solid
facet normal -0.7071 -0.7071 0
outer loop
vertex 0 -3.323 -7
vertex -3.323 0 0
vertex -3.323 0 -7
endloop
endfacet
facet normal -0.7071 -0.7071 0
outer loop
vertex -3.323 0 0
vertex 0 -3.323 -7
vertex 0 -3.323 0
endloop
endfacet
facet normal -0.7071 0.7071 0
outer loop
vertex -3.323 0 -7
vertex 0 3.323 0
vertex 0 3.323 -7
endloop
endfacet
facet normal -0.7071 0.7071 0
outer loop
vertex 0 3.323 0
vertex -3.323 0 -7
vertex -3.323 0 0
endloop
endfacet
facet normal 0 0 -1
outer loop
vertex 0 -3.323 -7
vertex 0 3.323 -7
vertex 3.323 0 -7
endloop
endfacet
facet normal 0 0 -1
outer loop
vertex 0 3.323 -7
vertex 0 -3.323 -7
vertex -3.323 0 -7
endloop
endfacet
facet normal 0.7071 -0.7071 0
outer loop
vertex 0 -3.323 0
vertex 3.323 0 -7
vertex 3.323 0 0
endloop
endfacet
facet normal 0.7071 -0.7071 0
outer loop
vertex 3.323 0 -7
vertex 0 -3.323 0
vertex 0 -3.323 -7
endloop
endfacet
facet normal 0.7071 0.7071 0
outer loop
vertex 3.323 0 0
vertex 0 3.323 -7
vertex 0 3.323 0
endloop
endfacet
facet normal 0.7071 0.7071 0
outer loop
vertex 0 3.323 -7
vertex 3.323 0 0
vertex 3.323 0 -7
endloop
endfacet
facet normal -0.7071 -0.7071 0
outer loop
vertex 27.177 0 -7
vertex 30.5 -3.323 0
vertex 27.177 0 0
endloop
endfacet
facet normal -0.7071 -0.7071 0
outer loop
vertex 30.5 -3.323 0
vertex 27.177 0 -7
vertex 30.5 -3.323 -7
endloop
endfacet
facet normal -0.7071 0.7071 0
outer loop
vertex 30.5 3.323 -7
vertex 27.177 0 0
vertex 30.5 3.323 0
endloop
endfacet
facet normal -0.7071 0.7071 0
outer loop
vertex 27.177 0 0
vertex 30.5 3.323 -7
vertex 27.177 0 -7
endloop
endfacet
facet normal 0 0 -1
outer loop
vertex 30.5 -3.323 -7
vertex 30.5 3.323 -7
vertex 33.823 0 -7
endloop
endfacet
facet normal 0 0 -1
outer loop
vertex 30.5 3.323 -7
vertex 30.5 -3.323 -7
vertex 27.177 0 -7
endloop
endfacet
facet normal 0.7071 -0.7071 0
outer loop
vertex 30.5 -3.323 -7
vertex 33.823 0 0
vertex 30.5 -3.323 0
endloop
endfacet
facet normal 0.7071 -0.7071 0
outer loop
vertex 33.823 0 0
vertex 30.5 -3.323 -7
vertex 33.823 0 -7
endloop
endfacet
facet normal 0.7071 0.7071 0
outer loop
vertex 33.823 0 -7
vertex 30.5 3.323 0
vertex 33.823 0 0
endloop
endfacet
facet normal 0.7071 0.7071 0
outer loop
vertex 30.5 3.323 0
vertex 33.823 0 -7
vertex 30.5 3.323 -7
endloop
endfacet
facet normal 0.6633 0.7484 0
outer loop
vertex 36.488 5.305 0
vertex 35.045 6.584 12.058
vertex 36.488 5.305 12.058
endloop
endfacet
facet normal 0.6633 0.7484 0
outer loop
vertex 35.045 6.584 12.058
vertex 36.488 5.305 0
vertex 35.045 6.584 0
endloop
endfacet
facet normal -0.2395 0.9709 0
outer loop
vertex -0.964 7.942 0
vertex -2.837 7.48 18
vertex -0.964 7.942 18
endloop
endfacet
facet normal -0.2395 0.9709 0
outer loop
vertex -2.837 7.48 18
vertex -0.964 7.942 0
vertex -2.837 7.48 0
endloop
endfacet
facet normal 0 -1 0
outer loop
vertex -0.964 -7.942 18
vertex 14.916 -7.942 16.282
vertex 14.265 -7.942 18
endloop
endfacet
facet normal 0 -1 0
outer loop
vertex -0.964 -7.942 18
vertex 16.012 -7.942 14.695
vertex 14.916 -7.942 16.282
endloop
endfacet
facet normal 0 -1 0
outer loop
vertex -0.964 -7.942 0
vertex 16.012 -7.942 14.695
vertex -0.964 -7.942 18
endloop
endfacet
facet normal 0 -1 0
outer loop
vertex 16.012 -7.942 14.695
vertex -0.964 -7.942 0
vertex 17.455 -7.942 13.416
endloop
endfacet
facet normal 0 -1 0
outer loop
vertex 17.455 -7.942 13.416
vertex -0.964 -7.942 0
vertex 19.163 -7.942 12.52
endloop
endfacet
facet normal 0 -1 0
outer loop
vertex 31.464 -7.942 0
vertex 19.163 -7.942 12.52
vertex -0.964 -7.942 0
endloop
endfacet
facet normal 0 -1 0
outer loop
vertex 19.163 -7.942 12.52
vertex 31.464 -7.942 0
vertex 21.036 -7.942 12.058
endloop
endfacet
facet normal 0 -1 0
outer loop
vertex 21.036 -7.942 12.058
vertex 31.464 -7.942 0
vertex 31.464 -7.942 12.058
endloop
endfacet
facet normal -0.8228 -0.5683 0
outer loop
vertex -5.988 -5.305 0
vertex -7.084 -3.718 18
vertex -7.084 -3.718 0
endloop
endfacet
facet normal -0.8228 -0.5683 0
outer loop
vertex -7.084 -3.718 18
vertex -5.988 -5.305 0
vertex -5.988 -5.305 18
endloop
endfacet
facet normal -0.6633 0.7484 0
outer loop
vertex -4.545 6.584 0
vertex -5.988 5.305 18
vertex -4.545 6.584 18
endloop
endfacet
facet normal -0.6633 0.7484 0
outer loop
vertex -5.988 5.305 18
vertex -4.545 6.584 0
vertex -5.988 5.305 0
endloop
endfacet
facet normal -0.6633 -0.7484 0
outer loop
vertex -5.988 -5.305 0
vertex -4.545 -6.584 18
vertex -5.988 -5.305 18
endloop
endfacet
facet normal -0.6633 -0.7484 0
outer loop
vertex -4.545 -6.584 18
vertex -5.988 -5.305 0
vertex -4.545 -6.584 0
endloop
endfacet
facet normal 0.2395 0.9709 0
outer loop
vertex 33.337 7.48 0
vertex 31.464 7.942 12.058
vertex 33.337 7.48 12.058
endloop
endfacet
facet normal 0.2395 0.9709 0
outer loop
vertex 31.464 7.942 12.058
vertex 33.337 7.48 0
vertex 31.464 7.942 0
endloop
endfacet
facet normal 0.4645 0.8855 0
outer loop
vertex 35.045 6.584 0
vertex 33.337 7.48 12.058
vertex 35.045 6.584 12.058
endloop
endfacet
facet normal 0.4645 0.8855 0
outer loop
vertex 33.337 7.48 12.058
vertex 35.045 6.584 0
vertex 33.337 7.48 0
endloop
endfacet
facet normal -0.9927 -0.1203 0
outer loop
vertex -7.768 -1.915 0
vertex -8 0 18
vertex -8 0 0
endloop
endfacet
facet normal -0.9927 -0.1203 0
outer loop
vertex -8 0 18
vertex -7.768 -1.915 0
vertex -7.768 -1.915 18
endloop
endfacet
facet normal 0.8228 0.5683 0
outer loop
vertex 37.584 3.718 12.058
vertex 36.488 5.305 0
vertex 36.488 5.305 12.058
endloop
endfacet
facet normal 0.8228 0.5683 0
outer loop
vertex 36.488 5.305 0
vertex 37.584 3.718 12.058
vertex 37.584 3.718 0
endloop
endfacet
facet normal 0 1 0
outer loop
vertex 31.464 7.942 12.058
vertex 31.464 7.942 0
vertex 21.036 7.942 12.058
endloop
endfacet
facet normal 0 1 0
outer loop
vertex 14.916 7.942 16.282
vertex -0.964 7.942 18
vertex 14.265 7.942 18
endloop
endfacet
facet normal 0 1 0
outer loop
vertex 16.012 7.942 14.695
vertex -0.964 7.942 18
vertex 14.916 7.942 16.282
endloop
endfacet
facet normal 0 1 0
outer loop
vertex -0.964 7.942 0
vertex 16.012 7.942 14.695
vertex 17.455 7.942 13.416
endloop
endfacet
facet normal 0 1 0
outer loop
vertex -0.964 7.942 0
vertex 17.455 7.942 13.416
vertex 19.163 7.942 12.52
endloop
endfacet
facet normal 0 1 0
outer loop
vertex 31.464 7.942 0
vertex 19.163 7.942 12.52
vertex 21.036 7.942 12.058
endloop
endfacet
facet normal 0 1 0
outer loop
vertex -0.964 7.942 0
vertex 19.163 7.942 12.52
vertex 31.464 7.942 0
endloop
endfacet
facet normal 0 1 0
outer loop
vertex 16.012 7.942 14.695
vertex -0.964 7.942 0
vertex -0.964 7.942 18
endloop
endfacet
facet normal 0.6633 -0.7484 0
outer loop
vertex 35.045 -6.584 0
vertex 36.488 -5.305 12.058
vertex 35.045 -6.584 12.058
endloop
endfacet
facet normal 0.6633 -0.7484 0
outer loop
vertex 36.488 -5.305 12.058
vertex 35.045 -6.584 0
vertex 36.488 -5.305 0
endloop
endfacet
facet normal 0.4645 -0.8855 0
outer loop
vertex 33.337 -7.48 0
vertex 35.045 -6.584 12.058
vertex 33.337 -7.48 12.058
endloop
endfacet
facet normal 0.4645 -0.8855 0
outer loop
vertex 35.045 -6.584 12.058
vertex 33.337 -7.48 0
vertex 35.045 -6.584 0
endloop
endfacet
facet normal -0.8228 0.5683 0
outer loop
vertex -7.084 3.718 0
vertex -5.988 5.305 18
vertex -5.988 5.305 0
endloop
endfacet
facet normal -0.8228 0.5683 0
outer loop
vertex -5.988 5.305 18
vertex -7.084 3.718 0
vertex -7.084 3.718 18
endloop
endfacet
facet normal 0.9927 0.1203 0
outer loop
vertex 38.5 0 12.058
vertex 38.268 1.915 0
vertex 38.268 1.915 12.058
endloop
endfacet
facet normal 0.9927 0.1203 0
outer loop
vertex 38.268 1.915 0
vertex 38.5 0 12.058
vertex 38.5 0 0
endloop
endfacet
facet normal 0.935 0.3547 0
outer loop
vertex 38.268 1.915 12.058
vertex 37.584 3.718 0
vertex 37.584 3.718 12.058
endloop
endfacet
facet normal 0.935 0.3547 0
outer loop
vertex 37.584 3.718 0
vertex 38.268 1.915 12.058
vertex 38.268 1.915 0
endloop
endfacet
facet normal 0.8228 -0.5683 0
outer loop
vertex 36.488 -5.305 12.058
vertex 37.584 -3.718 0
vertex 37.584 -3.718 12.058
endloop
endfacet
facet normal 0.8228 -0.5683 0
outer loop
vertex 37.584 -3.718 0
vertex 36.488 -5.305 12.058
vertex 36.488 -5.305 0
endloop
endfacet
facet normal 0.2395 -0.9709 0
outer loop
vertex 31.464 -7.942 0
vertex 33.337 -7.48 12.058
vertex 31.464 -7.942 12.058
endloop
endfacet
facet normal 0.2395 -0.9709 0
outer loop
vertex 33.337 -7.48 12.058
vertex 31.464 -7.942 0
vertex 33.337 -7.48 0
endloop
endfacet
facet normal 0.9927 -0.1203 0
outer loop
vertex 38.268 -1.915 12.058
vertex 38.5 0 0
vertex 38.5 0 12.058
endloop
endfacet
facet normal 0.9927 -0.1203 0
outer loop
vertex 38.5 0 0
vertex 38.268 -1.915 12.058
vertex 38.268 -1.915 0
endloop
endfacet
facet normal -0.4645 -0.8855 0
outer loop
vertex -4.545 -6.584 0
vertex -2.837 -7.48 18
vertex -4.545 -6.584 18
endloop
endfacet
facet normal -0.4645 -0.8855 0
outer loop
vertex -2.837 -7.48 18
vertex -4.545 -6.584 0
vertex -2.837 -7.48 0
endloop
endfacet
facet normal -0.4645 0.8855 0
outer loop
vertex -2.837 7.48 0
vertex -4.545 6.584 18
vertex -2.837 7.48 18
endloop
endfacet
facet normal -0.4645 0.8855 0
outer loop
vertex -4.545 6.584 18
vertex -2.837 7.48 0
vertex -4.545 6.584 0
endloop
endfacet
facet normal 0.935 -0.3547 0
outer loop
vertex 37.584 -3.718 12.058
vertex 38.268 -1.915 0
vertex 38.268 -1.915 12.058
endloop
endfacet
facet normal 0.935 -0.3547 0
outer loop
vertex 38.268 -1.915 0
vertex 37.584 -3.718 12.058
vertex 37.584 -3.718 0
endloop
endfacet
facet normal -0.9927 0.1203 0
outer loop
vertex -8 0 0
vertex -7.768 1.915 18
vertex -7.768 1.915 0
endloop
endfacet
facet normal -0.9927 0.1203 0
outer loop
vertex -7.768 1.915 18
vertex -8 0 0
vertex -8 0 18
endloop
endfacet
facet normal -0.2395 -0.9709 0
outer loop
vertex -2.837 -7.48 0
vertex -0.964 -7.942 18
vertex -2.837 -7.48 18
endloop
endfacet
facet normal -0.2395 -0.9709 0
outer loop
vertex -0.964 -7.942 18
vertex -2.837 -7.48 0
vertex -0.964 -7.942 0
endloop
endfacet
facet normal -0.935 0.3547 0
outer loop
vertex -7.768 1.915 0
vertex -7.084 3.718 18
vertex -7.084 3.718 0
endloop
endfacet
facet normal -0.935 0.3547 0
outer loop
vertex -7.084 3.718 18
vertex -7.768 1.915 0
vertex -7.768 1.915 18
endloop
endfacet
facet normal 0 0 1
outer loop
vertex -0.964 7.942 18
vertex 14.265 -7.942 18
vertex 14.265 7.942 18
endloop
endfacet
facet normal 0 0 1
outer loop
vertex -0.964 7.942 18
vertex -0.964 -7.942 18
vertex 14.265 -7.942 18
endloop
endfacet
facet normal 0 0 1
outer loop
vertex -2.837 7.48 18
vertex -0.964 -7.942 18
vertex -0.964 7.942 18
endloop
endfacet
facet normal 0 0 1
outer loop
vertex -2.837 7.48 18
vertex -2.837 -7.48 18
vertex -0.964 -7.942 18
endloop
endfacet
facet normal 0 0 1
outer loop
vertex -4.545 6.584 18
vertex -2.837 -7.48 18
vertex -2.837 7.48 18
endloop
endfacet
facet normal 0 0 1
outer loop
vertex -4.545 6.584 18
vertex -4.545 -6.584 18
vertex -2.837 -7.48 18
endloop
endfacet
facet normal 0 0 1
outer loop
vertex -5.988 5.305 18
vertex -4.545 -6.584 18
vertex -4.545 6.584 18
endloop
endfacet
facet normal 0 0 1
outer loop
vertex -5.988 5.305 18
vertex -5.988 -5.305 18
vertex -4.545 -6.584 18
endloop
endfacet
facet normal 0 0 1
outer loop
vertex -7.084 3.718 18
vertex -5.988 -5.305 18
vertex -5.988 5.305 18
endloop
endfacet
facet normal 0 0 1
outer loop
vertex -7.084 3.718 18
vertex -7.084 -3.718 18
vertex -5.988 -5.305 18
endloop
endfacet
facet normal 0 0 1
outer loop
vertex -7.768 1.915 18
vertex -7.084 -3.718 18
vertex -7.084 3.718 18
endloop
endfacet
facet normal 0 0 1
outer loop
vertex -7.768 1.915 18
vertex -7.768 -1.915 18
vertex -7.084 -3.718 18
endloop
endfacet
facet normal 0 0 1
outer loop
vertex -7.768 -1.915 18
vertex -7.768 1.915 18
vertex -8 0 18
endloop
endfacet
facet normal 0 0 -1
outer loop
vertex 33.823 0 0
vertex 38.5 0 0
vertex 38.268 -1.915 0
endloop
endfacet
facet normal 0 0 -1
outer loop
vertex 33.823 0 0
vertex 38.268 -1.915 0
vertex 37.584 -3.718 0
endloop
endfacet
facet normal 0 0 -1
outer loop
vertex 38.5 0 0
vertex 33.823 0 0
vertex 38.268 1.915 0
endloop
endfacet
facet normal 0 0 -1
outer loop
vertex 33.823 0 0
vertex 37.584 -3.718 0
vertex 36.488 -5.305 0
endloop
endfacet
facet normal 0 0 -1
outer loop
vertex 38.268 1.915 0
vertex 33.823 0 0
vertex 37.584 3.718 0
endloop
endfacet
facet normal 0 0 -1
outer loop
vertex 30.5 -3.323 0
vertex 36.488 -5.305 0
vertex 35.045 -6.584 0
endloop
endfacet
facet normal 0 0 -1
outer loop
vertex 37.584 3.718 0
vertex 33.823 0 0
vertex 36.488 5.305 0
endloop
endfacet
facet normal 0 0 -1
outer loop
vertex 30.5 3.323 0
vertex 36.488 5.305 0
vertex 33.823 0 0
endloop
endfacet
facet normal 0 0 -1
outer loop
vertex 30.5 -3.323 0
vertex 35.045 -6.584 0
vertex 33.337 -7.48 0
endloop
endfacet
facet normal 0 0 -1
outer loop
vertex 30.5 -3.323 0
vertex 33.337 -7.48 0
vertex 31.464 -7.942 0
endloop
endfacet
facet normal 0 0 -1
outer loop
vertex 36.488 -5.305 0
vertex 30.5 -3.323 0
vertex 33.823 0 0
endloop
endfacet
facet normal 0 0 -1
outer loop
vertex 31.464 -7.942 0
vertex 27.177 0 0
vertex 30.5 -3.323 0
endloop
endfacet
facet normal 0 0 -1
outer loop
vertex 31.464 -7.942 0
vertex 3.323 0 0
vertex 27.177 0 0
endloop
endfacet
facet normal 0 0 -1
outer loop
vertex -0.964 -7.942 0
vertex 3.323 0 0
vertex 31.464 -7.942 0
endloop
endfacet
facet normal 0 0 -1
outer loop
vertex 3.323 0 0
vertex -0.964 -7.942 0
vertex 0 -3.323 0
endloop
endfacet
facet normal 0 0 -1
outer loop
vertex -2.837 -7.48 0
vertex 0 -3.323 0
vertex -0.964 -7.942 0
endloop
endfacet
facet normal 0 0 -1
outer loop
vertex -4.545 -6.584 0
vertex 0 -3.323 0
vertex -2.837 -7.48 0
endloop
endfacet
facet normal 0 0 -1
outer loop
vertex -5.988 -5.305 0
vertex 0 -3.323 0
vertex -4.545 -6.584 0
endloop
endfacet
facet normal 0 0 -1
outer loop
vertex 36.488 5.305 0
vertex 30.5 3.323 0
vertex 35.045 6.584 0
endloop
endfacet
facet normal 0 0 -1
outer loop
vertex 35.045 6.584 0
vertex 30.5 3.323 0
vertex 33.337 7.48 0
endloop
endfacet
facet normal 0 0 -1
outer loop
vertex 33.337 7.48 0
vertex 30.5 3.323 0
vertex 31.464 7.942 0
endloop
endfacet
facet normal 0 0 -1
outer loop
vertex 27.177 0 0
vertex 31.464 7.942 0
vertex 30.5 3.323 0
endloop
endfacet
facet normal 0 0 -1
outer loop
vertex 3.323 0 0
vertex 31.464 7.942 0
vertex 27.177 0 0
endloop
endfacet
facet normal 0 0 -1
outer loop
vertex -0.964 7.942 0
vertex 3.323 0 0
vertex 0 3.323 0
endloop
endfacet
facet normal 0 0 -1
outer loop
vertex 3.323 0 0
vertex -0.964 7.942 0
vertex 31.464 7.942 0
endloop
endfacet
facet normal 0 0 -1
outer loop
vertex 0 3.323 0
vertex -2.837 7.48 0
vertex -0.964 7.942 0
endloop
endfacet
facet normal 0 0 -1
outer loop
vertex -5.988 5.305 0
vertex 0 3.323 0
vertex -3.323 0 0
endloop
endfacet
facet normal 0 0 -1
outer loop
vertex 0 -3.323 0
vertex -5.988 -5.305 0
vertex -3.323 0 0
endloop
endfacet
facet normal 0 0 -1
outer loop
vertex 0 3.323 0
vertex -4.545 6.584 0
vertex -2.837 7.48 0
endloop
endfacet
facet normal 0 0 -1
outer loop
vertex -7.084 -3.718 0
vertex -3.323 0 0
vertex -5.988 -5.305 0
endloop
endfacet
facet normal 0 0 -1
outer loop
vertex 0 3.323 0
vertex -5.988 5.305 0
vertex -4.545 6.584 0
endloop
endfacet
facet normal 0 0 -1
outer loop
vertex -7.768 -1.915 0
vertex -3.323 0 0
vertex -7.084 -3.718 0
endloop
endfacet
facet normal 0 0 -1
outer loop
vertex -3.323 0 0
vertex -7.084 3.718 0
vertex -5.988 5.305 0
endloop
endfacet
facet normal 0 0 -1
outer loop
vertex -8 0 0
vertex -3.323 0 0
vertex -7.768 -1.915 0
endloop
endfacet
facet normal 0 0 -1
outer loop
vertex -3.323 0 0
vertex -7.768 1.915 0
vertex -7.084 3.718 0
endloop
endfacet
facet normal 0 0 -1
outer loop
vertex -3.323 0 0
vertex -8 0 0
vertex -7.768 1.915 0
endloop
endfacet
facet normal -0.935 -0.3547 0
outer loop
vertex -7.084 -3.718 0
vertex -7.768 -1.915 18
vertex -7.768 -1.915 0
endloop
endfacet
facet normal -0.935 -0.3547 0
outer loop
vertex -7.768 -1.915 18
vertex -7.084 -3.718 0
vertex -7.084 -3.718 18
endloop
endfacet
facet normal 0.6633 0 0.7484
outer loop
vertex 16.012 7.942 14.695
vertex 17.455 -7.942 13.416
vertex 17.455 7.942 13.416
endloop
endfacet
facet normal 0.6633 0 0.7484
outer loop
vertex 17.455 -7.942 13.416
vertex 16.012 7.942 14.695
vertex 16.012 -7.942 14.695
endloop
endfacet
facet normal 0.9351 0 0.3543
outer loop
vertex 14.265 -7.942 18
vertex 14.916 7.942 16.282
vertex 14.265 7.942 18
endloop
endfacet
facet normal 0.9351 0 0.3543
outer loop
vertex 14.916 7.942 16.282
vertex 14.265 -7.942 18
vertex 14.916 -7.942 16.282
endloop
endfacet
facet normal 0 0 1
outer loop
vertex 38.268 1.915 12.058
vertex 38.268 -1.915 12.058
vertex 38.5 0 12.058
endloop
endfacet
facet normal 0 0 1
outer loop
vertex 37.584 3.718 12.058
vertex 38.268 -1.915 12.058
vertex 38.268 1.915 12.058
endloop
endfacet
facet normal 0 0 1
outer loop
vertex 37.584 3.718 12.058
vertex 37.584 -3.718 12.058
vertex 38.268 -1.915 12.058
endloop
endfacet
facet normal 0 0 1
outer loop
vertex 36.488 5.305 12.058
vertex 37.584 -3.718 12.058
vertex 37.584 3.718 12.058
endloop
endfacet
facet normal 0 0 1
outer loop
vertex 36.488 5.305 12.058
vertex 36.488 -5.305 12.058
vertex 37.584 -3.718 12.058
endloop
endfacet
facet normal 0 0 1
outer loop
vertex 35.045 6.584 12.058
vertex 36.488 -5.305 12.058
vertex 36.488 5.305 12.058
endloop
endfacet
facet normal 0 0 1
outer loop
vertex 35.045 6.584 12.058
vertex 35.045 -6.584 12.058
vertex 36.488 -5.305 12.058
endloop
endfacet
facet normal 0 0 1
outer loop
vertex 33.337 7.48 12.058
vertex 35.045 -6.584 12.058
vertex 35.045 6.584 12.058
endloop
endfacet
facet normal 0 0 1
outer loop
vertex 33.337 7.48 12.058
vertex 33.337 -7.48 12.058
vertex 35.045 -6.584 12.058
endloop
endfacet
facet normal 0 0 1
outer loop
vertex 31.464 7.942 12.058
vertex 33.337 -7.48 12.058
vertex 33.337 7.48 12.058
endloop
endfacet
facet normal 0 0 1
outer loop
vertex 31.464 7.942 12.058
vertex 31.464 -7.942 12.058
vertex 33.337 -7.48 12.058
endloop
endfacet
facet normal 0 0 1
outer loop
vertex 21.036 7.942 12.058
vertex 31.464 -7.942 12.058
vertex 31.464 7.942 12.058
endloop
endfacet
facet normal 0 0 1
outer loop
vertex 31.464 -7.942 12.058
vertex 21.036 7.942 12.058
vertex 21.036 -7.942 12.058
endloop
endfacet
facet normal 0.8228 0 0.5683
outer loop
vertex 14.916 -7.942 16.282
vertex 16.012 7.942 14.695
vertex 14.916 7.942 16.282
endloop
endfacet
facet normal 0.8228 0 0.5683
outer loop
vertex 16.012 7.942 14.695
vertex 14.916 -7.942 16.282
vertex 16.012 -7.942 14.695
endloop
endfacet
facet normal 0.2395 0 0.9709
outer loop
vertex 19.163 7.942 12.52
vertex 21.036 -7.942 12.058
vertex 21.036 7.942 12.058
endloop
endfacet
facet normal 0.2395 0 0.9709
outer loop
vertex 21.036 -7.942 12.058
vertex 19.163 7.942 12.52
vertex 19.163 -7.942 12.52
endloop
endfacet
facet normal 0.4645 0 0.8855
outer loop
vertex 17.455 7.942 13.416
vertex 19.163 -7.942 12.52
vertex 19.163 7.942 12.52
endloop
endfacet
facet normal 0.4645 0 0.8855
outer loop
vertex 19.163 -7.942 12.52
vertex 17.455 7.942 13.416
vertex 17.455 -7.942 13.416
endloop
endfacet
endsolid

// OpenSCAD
//16,50,12
translate([0,0,5-7]){
rotate([0,0,45])
cube([4.7,4.7,10],center=true);
//translate([35.5-35.5+6.5+24,0,0])
translate([6.5+24,0,0])
rotate([0,0,45])
cube([4.7,4.7,10],center=true);
}
difference(){
hull(){
cylinder(d=16,h=18);
translate([6.5+24,0,0])
cylinder(d=16,h=18);
}
translate([22,0,16/2+12])
hull(){
rotate([90,0,0])
cylinder(d=16,h=18,center=true);
translate([35.5+sqrt(2*(4.7*4.7)),0,0])
rotate([90,0,0])
cylinder(d=16,h=18,center=true);
}
}
